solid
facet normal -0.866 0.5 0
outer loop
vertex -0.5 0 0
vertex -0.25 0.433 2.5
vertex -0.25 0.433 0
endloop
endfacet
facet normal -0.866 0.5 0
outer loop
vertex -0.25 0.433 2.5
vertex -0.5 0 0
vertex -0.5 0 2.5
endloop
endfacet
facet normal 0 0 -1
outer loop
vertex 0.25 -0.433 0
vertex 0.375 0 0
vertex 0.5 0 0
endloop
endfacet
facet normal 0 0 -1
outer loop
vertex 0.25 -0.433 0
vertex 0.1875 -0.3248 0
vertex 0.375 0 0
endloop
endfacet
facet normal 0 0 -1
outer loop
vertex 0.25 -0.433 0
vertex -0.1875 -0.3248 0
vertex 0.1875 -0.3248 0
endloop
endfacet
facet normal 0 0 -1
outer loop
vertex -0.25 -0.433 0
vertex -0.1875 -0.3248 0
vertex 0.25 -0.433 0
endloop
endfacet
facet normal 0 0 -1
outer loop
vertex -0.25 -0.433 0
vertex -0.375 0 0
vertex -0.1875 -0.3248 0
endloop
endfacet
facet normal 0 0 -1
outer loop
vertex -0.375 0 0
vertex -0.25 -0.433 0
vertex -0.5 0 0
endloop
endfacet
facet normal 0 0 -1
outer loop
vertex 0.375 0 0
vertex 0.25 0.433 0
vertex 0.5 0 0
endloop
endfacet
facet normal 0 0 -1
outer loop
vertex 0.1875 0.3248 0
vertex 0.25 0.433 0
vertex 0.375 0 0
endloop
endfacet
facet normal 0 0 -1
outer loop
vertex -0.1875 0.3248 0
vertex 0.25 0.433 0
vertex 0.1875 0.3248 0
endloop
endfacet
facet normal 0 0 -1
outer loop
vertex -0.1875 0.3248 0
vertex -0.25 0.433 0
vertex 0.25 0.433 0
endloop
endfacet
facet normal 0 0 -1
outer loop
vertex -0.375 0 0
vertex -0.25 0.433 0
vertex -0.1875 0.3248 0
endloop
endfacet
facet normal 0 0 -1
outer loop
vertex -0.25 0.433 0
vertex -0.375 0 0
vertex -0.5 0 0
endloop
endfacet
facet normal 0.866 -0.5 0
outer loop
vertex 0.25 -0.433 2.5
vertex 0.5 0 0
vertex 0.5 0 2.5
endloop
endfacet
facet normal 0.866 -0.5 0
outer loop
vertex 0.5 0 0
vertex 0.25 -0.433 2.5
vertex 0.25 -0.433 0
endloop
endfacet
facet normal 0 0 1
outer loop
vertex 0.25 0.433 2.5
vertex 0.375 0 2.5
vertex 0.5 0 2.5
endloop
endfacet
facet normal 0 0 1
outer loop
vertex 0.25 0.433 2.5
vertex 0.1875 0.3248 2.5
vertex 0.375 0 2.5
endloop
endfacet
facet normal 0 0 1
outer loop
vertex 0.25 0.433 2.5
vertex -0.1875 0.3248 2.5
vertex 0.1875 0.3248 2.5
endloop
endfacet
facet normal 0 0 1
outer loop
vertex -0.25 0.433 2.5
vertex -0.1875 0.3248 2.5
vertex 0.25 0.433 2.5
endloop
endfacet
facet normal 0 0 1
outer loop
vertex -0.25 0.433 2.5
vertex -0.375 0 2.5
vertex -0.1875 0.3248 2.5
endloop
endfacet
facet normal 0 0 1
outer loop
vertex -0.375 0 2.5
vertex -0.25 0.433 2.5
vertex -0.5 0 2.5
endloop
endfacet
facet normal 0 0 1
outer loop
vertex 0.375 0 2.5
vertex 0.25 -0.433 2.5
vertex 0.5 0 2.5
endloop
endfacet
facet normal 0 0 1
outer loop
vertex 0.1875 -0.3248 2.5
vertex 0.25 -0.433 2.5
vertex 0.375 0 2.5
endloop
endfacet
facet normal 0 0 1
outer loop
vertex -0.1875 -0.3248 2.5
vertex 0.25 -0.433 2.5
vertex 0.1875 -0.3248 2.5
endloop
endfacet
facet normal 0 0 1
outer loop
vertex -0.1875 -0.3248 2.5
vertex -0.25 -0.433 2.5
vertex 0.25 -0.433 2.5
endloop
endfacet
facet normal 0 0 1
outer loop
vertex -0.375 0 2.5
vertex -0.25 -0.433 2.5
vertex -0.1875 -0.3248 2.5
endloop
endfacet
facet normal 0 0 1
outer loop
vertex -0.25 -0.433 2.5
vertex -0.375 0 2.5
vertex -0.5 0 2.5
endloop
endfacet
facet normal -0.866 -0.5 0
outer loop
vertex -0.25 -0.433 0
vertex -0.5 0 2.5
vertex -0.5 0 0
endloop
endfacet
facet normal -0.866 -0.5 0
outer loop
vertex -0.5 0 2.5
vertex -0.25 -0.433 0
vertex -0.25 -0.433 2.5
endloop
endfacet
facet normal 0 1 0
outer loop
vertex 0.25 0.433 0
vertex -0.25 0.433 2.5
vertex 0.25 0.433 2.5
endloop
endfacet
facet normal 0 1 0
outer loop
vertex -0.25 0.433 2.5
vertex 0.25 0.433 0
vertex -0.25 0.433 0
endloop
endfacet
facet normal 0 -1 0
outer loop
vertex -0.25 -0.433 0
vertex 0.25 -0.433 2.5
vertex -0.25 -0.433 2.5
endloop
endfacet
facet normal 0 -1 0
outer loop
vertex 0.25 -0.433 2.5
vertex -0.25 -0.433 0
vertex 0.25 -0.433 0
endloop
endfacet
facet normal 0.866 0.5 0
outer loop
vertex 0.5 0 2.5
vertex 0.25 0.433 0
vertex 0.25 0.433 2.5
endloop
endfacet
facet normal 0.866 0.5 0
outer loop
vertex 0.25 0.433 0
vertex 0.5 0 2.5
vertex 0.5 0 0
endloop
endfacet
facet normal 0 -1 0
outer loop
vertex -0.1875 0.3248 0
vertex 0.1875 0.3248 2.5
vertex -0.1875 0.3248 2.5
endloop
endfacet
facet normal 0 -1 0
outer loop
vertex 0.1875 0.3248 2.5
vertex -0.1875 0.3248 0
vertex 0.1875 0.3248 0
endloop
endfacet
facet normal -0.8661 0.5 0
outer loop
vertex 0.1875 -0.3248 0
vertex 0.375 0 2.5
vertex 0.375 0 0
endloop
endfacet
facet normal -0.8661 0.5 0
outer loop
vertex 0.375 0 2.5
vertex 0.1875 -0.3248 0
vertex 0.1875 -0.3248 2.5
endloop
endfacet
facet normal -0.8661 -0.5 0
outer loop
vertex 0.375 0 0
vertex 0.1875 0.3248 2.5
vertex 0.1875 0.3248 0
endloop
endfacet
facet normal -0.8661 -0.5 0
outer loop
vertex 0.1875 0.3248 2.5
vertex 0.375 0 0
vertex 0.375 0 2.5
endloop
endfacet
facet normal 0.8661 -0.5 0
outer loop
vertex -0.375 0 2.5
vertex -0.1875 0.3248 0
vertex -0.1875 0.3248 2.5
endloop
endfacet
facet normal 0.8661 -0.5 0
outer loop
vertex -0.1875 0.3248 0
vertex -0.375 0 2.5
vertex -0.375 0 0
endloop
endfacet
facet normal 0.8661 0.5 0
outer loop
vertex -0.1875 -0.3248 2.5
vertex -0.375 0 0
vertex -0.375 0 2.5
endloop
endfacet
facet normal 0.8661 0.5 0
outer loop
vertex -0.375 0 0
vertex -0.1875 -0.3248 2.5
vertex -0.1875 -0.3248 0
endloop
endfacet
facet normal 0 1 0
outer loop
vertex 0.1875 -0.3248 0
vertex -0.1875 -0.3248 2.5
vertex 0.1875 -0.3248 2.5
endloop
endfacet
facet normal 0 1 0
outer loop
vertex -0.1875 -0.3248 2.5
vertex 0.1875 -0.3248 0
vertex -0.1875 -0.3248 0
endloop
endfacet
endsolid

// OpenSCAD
inner_radius = 3/8;
outer_radius = 0.5; 
length = 2.5;

module hex_projection(ra)
{
    circle(ra, $fn = 6, center = true);
    
    }
    
module flat_hex(ri,ro)
    {
            difference()
                {
                    hex_projection(ro);
                    hex_projection(ri);
                }
    }
    
module extruded_hex(radius, height)
    {
            linear_extrude(height = height,
        center = true, convexity = 10, twist = 0, slices = 40, 
        scale = 1.0) {hex_projection(radius);}
    }
    
module adapter_projection(inner,outer,le)
    {
        translate(v=[0,0,le/2])
        difference()
        {
            
            extruded_hex(outer, le);
            extruded_hex(inner, le+0.5);
            
        }
    }
    
//----------------
    
adapter_projection(inner_radius, outer_radius, length);
//flat_hex(inner_radius, outer_radius);
